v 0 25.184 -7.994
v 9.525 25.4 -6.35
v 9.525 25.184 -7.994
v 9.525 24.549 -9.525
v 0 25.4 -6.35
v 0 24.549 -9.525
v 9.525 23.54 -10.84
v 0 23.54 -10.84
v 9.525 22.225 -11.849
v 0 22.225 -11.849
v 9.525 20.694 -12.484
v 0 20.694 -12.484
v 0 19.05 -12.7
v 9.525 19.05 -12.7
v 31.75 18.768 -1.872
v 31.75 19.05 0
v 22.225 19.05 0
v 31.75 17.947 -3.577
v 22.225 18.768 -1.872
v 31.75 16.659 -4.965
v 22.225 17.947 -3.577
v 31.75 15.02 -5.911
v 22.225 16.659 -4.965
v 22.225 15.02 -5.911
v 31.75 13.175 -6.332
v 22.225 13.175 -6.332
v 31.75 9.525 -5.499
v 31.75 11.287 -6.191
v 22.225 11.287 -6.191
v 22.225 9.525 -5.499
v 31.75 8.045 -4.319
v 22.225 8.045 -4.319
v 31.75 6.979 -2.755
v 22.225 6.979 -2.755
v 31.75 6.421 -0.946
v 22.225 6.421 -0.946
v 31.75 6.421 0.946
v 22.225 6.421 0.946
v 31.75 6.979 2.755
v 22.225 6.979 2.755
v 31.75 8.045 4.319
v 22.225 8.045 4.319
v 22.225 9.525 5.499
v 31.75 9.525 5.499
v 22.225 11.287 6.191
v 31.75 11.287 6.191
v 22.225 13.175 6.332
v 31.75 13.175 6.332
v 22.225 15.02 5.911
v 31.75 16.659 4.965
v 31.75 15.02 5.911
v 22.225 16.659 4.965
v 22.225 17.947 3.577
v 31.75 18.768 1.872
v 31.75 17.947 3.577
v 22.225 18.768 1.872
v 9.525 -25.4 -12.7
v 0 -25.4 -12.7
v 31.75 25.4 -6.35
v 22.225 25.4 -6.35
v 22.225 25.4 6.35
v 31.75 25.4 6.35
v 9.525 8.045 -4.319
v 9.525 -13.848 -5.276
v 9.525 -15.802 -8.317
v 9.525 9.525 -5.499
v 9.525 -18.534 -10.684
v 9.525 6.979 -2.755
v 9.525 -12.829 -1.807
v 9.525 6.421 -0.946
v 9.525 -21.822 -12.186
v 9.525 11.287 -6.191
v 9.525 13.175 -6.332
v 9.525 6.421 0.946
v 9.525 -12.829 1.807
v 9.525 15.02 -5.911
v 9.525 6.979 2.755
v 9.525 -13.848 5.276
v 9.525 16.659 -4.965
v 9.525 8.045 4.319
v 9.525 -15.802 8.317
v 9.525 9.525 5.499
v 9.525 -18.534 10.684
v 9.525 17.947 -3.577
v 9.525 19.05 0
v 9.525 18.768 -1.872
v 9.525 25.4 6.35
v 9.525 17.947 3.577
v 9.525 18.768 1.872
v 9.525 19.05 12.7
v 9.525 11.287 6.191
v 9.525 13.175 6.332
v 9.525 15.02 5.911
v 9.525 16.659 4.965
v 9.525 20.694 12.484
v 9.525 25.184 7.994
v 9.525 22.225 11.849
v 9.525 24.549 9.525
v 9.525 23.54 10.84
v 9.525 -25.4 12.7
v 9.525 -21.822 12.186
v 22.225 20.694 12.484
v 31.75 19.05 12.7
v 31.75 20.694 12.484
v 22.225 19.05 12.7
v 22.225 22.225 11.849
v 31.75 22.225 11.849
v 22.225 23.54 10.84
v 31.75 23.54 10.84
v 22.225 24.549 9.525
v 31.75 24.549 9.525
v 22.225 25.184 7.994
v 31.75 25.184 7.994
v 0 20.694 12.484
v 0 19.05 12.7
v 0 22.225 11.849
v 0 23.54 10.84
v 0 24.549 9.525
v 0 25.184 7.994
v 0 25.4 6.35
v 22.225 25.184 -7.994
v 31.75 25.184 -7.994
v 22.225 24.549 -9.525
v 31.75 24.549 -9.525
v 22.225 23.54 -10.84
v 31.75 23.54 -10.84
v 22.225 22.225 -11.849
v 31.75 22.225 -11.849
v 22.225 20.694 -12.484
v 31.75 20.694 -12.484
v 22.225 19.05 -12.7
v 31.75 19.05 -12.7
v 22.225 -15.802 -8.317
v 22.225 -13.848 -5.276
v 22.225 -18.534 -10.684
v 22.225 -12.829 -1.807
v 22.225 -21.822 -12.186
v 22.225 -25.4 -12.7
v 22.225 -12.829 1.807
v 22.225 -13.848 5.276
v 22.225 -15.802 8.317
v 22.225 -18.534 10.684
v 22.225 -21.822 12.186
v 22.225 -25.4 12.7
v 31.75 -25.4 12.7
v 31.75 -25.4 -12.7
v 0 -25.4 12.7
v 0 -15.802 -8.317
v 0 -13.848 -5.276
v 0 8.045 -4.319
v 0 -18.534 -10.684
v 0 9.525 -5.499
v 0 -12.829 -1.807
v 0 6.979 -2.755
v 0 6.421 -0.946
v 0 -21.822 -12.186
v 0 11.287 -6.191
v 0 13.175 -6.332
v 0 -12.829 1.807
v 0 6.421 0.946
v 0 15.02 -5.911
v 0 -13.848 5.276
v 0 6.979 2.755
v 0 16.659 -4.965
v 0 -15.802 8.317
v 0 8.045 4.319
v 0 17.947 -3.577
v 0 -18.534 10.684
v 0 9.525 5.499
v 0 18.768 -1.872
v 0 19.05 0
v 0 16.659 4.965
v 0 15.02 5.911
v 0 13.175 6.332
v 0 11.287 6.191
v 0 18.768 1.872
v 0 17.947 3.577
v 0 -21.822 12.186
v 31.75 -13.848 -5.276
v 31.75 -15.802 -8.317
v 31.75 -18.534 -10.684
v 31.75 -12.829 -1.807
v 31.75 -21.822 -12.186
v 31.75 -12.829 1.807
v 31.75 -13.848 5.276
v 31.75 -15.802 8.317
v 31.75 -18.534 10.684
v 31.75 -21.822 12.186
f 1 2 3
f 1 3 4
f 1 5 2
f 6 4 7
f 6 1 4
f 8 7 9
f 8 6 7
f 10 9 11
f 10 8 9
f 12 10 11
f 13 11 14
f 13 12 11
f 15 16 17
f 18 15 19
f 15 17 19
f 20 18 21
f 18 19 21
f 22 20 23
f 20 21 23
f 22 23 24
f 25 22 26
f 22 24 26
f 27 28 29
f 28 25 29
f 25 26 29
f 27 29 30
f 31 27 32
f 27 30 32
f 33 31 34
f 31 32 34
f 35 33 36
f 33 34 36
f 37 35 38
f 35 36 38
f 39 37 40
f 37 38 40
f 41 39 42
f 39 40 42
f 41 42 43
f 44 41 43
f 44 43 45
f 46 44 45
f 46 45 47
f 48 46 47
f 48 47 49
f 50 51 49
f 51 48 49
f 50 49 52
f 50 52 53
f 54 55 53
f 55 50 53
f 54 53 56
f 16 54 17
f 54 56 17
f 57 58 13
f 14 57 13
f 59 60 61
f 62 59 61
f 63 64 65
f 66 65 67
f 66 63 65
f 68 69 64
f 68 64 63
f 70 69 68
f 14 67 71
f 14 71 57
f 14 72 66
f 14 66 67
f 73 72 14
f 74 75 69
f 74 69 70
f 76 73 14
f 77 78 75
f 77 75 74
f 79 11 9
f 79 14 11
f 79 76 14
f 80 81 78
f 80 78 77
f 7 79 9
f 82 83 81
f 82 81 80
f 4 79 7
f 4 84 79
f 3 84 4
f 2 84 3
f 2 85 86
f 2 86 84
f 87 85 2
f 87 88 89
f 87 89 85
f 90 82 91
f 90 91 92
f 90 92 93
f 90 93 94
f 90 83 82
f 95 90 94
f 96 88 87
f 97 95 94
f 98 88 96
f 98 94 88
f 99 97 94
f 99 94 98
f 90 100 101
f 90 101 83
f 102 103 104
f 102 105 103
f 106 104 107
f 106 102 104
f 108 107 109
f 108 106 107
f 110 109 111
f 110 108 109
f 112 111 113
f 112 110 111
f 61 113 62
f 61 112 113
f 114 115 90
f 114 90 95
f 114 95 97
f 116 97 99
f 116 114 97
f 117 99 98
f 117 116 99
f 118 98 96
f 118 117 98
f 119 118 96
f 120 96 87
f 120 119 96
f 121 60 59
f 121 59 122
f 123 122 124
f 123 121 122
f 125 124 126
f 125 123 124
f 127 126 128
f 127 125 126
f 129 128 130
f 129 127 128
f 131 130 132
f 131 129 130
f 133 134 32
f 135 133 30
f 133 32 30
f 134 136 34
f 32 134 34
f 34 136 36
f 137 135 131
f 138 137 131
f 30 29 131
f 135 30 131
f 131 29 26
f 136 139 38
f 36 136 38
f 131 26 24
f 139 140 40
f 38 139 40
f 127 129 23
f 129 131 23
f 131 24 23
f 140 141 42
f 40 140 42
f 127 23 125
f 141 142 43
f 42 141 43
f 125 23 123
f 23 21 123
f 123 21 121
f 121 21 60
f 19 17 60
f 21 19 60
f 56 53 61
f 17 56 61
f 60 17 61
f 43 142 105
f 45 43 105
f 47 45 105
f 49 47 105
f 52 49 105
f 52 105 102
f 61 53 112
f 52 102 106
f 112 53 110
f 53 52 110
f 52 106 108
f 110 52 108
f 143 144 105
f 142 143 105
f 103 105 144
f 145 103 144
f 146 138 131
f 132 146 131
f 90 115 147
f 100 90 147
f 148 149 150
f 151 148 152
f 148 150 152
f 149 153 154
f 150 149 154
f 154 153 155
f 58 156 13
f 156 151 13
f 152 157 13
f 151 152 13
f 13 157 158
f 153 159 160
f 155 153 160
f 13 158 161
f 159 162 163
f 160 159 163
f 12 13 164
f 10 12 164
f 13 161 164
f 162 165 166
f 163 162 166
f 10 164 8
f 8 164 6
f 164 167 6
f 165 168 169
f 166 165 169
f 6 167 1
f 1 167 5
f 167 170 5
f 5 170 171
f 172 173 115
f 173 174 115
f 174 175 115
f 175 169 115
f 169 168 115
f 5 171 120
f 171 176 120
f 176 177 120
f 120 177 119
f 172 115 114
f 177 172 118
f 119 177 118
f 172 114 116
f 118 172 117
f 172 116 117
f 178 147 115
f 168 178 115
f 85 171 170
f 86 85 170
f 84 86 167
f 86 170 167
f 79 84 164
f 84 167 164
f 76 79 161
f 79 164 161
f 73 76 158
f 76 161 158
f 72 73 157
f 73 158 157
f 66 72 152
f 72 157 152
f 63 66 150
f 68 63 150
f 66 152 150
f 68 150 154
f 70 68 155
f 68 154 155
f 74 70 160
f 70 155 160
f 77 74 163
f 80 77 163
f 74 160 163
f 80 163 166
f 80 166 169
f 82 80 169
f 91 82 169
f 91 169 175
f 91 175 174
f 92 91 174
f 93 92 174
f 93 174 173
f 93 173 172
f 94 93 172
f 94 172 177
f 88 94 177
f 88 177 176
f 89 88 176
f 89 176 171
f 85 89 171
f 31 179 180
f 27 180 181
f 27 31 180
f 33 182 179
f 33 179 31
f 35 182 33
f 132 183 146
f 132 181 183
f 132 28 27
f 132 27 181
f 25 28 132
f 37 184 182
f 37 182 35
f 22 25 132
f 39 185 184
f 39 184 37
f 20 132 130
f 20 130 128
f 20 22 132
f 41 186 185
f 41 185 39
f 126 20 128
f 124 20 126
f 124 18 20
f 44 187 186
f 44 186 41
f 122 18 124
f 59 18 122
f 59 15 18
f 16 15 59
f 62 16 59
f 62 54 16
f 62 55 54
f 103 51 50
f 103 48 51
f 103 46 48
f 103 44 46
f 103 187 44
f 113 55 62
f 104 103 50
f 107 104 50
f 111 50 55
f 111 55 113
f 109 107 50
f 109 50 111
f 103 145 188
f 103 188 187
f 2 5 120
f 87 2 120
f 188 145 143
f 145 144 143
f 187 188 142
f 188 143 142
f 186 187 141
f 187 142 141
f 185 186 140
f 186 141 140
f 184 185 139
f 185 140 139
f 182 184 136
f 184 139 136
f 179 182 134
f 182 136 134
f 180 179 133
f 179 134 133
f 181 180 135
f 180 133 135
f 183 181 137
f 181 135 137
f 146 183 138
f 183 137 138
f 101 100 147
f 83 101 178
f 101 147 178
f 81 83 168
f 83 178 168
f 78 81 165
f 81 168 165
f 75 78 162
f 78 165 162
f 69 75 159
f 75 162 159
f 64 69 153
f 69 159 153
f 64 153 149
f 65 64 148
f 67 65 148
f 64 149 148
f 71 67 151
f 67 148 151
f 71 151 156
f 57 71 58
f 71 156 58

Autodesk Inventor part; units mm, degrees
ref_plane "YZ Plane" through (0, 0, 0) normal (1, 0, 0) x (0, 1, 0)
ref_plane "XZ Plane" through (0, 0, 0) normal (0, 1, 0) x (-1, 0, 0)
ref_plane "XY Plane" through (0, 0, 0) normal (0, 0, 1) x (1, 0, 0)
sketch "Sketch1" plane through (0, 0, 0) normal (1, 0, 0) x (0, 1, 0)
  line L0 (19.05, 12.7) -> (-25.4, 12.7)
  line L1 (-25.4, -12.7) -> (19.05, -12.7)
  line L2 (25.4, -6.35) -> (25.4, 6.35)
  line L3 (25.4, 12.7) -> (-25.4, -12.7) construction
  line L4 (-25.4, 12.7) -> (25.4, -12.7) construction
  circle A0 centre (12.7, 0) radius 6.35
  arc A1 (25.4, 6.35) -> (19.05, 12.7) centre (19.05, 6.35) ccw
  arc A2 (19.05, -12.7) -> (25.4, -6.35) centre (19.05, -6.35) ccw
  arc A3 (-25.4, -12.7) -> (-25.4, 12.7) centre (-25.4, 0) ccw
  point P0 (0, 0)
  dimension "d1" = 25.4
  dimension "d2" = 12.7
  dimension "d3" = 6.35
  dimension "d5" = 12.7
  dimension "d6" = 50.8
  dimension "d7" = 38.1
extrude "Extrusion1" add sketch "Sketch1" along normal blind 31.75
sketch "Sketch3" plane through (0, -25.4, 12.7) normal (0, 0, 1) x (1, 0, 0)
  line L0 (0, 44.45) -> (0, 0) projected
  line L1 (0, 0) -> (31.75, 0) projected
  line L2 (9.525, 0) -> (22.225, 0)
  line L3 (22.225, 0) -> (22.225, 50.8)
  line L4 (0, 50.8) -> (31.75, 50.8) projected
  line L5 (9.525, 0) -> (9.525, 50.8)
  line L6 (9.525, 50.8) -> (22.225, 50.8)
  point P0 (0, 25.4)
  dimension "d14" = 9.525
  dimension "d15" = 12.7
extrude "Extrusion3" cut sketch "Sketch3" against normal blind 25.4
properties part number "harness attachments"
